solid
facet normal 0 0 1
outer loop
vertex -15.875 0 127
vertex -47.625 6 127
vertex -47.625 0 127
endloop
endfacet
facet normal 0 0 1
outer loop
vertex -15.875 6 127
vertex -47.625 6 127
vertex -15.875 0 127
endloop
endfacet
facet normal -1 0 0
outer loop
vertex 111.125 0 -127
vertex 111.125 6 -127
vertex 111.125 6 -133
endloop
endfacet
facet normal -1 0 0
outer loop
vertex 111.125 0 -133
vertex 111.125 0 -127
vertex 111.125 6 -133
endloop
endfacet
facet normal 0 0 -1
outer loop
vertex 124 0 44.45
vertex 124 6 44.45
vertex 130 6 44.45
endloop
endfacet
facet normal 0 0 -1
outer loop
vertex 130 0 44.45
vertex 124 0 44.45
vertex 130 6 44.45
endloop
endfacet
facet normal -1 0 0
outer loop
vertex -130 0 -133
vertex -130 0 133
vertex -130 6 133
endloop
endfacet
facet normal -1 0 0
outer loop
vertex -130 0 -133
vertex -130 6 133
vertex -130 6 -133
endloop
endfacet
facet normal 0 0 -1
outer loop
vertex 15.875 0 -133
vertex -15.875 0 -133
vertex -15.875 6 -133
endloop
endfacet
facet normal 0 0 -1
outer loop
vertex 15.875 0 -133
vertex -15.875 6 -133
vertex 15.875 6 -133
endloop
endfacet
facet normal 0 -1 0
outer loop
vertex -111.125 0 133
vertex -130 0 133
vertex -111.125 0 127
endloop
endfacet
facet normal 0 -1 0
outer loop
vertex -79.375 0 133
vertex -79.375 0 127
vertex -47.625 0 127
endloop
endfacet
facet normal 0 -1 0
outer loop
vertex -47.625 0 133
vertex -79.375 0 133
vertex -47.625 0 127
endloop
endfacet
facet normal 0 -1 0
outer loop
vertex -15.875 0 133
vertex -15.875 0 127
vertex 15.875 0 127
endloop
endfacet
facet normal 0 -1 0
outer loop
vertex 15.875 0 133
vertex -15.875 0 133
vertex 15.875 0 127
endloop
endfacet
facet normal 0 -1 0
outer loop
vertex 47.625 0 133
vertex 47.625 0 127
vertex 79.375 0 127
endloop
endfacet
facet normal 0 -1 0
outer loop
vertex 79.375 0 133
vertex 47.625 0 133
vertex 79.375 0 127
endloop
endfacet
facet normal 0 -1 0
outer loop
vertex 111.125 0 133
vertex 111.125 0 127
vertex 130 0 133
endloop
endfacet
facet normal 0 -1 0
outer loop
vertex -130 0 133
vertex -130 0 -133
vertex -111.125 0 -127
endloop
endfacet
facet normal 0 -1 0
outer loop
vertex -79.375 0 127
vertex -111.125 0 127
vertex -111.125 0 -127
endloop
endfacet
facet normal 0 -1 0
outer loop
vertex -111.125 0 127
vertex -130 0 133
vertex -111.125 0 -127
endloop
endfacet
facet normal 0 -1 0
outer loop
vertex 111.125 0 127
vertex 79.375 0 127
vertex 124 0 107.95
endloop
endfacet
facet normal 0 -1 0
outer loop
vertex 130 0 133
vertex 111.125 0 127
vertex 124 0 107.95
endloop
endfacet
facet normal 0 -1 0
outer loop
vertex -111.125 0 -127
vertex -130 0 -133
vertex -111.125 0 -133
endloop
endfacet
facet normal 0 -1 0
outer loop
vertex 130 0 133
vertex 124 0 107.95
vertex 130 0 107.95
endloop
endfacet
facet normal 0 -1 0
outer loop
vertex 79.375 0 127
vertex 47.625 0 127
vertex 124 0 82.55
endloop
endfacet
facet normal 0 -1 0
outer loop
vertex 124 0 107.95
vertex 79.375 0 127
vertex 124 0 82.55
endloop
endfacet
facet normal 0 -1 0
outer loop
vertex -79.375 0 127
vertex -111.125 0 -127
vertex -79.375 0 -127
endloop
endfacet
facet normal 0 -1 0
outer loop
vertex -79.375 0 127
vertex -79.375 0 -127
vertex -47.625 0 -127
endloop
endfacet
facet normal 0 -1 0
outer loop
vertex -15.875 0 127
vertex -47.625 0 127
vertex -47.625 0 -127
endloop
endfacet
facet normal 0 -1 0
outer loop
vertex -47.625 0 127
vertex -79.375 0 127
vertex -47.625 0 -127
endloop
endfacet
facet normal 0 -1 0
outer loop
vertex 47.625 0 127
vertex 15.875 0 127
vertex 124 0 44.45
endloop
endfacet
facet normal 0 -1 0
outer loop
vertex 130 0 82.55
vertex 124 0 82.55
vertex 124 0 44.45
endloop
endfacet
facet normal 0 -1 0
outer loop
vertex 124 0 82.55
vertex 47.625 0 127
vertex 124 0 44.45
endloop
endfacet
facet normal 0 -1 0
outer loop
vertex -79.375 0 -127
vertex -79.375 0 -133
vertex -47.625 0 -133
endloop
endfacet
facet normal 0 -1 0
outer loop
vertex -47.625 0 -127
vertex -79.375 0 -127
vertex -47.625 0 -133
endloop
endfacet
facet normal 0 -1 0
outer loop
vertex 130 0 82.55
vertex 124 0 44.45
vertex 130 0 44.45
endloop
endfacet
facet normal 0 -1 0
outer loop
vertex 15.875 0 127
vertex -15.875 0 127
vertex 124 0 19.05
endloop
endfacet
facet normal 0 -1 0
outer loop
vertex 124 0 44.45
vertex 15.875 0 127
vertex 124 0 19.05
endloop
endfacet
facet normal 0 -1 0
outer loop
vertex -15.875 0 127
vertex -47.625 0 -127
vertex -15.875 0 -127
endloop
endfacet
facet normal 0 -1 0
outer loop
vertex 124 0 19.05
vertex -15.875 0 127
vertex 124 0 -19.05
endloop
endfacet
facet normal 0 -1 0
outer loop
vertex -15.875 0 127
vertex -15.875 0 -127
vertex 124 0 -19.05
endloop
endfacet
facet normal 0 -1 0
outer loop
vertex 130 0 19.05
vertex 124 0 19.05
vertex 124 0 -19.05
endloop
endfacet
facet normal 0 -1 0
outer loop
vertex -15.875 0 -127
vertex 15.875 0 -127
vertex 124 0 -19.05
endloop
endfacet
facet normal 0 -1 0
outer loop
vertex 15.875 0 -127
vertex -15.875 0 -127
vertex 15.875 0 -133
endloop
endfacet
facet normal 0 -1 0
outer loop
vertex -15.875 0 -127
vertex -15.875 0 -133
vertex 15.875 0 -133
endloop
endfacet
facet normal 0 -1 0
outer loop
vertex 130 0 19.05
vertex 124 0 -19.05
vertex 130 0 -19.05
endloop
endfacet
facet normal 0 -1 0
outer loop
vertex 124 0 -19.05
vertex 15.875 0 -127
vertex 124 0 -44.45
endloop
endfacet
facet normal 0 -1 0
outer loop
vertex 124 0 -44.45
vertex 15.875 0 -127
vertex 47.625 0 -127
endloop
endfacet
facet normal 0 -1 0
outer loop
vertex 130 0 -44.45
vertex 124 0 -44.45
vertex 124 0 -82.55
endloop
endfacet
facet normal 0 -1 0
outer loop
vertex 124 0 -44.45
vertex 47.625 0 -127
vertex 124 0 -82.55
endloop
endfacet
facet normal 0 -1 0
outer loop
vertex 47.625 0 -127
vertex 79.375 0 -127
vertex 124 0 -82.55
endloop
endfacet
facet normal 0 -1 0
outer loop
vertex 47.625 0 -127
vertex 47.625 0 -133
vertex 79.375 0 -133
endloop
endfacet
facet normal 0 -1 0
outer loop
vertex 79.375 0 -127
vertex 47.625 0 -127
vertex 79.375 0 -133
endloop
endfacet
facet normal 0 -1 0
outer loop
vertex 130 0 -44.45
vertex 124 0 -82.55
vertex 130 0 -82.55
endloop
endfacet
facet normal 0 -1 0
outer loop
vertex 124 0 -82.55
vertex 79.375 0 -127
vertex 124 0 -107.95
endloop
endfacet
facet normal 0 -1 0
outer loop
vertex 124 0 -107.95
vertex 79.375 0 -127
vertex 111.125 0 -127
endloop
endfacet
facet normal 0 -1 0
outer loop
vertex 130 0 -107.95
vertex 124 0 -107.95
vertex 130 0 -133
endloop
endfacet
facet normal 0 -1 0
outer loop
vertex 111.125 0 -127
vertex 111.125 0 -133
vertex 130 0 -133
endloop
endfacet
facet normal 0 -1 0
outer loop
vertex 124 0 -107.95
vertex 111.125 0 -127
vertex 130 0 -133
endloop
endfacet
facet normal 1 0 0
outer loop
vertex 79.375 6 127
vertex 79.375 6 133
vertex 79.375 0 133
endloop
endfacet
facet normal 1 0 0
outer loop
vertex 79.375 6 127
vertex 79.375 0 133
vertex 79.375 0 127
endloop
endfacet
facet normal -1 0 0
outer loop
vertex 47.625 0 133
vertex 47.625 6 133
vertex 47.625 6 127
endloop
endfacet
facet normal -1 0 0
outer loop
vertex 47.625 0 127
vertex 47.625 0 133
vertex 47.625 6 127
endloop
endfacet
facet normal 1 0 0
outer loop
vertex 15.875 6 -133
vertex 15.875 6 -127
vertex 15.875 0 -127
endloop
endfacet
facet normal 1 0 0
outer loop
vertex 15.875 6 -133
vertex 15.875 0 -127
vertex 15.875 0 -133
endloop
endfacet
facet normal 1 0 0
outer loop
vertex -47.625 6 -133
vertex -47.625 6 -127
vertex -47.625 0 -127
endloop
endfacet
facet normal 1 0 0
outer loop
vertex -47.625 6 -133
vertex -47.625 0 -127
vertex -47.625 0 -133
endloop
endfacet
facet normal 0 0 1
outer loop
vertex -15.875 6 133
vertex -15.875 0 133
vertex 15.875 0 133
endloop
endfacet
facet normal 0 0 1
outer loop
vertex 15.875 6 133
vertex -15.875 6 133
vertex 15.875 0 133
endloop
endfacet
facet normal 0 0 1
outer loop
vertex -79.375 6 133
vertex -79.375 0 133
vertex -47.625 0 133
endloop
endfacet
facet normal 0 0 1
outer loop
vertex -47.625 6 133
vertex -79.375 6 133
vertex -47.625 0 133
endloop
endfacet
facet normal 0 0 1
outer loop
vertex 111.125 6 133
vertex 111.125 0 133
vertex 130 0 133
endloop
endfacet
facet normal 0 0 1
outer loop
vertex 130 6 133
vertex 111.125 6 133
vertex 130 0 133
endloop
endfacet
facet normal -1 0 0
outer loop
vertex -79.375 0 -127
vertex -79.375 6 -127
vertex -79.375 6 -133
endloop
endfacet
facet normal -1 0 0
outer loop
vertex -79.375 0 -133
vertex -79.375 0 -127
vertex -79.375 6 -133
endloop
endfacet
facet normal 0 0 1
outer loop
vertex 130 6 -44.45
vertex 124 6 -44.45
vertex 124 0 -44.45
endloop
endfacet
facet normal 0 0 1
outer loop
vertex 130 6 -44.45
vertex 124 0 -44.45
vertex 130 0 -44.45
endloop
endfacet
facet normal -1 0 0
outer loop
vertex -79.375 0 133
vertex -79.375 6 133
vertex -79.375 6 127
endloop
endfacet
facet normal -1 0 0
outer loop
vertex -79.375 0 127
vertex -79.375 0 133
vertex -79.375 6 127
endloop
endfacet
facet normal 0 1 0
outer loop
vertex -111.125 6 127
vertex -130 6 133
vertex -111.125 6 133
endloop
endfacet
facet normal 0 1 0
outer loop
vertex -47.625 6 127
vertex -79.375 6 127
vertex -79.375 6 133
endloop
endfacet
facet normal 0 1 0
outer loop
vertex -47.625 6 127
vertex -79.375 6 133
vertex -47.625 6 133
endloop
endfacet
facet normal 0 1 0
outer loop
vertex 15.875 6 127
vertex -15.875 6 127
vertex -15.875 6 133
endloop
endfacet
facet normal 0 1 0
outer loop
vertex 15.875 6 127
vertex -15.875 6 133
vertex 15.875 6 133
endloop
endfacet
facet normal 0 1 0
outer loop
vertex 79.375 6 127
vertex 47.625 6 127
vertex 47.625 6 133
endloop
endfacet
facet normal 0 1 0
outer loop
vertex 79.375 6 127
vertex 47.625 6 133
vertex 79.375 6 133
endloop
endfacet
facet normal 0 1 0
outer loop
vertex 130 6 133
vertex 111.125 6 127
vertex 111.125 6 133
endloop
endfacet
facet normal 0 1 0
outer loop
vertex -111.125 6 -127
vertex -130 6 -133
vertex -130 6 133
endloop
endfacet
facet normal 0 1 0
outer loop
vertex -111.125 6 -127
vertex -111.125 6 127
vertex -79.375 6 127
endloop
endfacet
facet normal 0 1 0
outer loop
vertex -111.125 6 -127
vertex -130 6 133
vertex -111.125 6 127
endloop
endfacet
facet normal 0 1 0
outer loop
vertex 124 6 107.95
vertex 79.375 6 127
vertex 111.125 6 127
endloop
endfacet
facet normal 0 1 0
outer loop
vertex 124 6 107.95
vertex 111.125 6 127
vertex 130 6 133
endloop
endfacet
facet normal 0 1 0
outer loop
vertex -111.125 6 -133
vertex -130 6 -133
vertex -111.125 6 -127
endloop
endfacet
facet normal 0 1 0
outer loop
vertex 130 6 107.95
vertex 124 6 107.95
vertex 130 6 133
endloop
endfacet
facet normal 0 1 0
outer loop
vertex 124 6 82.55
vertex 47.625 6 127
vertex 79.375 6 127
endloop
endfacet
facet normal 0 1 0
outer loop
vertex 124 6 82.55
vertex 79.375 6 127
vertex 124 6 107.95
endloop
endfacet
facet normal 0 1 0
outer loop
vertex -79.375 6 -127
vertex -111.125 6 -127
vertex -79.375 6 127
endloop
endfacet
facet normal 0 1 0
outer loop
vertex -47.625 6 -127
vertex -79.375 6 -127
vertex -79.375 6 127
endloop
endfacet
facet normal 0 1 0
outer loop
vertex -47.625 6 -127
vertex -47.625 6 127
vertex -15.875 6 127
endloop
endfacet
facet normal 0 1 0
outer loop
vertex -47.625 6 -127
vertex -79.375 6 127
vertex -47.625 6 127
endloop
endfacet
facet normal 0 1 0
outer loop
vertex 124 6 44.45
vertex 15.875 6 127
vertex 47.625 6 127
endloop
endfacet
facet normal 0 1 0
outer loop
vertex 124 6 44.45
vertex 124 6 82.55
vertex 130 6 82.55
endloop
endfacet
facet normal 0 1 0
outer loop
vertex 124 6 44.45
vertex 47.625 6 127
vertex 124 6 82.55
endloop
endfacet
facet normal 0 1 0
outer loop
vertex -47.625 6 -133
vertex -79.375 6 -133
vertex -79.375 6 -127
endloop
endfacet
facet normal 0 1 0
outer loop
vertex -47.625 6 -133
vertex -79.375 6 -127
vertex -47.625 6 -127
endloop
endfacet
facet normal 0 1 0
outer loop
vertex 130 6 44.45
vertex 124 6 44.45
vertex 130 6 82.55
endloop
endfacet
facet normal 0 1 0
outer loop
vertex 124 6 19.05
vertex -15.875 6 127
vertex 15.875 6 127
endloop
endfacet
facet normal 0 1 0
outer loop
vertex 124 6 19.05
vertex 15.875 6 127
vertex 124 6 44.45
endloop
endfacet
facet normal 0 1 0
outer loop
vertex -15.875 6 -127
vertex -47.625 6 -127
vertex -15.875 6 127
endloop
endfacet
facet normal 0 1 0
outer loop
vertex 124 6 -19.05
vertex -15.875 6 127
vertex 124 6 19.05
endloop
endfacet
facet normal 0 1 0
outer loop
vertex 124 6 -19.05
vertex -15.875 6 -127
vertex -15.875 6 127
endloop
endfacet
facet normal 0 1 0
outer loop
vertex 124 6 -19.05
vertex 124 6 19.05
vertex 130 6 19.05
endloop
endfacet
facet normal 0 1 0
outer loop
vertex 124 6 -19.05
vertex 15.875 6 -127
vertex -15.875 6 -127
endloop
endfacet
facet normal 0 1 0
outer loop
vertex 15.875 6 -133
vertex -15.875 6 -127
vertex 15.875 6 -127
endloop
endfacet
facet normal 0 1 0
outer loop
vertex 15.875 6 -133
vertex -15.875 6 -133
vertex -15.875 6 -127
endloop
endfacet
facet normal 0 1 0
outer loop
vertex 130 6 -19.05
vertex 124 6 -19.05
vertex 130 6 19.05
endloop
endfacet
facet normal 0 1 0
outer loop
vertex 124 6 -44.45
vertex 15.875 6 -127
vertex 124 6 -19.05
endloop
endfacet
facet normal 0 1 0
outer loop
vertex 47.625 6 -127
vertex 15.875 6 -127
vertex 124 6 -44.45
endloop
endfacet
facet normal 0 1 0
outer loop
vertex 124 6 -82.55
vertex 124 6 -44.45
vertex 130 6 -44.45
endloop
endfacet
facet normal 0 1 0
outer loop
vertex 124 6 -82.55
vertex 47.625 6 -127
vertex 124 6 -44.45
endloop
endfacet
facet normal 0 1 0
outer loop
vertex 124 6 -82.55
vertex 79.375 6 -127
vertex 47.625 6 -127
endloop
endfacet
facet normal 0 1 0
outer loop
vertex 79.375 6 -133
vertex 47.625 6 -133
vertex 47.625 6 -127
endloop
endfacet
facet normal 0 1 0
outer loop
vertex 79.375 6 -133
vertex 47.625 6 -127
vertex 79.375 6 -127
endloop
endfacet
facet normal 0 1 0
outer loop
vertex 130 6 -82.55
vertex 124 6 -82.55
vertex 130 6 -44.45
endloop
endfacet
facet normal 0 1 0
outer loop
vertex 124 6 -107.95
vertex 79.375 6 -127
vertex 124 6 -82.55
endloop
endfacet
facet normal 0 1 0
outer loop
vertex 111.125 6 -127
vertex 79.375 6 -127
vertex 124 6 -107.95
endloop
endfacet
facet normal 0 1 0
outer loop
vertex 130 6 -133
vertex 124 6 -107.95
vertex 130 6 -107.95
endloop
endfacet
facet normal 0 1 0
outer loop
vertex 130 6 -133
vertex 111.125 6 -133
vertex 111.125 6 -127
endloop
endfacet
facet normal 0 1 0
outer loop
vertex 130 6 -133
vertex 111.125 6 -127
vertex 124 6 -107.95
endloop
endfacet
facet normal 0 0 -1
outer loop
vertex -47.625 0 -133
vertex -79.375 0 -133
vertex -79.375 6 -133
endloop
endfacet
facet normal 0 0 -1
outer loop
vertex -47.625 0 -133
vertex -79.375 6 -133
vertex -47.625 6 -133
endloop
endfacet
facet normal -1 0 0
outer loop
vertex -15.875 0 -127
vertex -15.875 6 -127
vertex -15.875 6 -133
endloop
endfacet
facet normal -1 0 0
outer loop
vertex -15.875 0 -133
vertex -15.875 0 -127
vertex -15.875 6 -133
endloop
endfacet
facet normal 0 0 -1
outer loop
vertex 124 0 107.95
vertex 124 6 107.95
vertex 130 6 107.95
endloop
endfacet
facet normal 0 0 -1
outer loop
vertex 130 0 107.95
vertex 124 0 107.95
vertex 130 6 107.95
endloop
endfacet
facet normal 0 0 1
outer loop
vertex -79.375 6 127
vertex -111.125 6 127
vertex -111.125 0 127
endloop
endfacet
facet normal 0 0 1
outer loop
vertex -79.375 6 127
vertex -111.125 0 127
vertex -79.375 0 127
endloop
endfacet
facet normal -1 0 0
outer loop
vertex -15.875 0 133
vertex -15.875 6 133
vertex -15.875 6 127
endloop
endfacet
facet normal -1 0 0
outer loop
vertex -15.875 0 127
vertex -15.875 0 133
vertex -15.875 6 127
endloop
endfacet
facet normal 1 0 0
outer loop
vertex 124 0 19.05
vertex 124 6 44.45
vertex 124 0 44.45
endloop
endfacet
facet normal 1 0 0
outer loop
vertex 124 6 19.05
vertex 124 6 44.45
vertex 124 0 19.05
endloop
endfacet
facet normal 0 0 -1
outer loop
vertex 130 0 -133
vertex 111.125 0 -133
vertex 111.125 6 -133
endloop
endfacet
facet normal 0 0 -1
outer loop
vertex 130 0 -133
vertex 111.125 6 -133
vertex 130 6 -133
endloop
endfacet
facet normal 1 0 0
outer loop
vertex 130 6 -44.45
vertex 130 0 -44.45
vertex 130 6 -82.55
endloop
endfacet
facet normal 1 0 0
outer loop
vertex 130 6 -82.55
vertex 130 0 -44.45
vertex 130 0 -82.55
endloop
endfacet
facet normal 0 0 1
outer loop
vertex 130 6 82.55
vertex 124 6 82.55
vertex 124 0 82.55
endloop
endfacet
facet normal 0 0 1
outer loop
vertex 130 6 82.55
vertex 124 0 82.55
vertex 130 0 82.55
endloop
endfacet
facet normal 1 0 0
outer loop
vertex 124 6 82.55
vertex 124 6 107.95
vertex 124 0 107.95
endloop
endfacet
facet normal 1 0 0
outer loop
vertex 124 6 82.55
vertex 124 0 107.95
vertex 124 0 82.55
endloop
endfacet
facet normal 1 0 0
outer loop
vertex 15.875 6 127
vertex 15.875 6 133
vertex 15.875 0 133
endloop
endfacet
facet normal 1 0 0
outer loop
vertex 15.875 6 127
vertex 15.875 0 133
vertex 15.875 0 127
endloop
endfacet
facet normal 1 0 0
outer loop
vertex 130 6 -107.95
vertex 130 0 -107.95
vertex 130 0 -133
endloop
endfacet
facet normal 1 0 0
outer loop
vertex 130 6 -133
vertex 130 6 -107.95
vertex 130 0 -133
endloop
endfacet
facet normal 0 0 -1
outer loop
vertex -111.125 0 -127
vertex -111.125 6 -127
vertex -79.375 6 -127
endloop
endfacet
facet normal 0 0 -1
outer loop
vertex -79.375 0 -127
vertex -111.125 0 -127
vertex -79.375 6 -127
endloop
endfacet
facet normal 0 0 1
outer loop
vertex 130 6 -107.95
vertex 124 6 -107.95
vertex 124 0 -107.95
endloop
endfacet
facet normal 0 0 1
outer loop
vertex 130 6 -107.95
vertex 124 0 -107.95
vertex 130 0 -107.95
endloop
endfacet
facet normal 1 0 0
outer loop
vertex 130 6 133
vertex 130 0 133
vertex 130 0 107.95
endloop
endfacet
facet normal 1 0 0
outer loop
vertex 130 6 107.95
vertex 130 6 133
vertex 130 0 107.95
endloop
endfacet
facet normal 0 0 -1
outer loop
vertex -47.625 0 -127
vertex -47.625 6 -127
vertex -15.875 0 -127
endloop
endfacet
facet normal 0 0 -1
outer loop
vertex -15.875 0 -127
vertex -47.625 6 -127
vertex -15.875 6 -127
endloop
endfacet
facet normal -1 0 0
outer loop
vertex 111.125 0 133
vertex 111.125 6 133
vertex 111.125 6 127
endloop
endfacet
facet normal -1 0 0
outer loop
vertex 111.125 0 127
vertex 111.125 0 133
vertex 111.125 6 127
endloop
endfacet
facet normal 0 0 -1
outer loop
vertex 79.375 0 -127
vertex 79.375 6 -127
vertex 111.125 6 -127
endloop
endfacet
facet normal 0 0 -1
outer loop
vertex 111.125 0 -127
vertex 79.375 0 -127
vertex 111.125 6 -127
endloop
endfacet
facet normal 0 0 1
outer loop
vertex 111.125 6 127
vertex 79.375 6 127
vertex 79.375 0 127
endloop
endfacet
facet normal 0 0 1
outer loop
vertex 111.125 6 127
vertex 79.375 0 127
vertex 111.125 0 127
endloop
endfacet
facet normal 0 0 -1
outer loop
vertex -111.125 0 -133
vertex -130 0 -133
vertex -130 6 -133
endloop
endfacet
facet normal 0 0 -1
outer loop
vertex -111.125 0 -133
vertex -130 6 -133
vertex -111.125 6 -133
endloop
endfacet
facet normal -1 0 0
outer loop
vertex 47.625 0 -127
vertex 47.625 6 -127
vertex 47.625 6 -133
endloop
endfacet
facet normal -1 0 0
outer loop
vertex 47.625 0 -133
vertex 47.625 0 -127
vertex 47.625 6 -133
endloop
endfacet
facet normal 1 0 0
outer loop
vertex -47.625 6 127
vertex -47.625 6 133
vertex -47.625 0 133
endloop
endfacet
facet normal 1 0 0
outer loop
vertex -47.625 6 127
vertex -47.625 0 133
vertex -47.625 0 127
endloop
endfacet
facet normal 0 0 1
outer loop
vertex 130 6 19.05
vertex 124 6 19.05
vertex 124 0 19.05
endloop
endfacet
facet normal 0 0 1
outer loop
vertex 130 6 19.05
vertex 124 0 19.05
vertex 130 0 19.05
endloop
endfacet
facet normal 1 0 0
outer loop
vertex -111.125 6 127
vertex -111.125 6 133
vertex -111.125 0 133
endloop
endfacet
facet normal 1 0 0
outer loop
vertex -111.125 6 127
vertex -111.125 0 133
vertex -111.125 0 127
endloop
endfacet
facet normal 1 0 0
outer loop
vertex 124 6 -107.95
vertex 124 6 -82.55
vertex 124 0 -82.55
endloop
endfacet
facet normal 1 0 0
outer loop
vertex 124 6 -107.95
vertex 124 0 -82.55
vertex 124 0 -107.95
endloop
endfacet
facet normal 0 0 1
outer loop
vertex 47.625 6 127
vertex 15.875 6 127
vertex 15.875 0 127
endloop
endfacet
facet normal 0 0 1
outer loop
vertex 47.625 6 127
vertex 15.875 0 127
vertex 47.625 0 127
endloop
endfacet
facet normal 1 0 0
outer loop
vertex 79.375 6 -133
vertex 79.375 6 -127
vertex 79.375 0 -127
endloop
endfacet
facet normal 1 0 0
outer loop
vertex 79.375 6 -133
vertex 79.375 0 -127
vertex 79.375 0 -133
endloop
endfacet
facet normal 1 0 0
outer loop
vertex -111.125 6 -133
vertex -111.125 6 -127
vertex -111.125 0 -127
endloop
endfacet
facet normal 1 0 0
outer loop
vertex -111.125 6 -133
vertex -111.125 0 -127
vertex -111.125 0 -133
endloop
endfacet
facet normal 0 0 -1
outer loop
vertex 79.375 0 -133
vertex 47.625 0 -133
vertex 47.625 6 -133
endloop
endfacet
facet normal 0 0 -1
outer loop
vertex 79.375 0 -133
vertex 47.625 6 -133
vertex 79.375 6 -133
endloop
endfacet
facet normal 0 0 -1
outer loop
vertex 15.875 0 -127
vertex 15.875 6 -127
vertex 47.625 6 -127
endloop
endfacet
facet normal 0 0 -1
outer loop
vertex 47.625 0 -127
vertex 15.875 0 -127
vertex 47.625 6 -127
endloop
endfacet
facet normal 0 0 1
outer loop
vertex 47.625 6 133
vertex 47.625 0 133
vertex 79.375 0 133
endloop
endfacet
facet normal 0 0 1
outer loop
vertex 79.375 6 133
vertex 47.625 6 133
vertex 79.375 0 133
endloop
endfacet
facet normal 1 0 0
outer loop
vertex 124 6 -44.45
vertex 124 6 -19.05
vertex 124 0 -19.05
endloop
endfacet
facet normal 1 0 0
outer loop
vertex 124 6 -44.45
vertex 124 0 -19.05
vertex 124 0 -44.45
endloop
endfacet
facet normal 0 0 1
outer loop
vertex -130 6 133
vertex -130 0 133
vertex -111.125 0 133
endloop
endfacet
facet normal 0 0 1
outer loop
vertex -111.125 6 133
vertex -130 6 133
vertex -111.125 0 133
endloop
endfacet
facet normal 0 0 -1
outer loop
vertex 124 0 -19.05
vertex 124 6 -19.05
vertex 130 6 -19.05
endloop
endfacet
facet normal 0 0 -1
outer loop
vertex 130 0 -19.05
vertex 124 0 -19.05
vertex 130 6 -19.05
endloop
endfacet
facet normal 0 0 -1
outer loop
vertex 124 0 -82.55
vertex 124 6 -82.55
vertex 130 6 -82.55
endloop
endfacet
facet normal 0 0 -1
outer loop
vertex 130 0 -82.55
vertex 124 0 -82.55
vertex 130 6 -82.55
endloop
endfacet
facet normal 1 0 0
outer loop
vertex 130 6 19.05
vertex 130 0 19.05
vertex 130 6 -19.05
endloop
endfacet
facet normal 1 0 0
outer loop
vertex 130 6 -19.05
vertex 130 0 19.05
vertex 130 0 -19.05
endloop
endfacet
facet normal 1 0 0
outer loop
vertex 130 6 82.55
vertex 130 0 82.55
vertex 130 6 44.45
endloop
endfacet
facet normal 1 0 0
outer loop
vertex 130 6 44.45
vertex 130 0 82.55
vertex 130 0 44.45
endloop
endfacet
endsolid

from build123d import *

# Parameters (mm, degrees)
SKETCH1_W           = 260
SKETCH1_H           = 266
BOSS_EXTRUDE1_DEPTH = 6
SKETCH2_W           = 31.75
SKETCH2_H           = 6
SKETCH2_W_2         = 6
SKETCH2_H_2         = 25.4
TAB_CUT_OUTS_DEPTH  = 6


with BuildPart() as part:
    # Sketch1 → Boss-Extrude1 (new body)
    with BuildSketch(Plane(origin=(0, 0, 0), x_dir=(1, 0, 0), z_dir=(0, 1, 0))):
        Rectangle(SKETCH1_W, SKETCH1_H)
    extrude(amount=BOSS_EXTRUDE1_DEPTH)

    # Sketch2 → Tab Cut Outs (cut)
    with BuildSketch(Plane(origin=(0, 6, 0), x_dir=(1, 0, 0), z_dir=(0, 1, 0))):
        with Locations((95.25, 130)):
            Rectangle(SKETCH2_W, SKETCH2_H)
        with Locations((-31.75, 130)):
            Rectangle(SKETCH2_W, SKETCH2_H)
        with Locations((-95.25, 130)):
            Rectangle(SKETCH2_W, SKETCH2_H)
        with Locations((31.75, 130)):
            Rectangle(SKETCH2_W, SKETCH2_H)
        with Locations((31.75, -130)):
            Rectangle(SKETCH2_W, SKETCH2_H)
        with Locations((95.25, -130)):
            Rectangle(SKETCH2_W, SKETCH2_H)
        with Locations((-95.25, -130)):
            Rectangle(SKETCH2_W, SKETCH2_H)
        with Locations((-31.75, -130)):
            Rectangle(SKETCH2_W, SKETCH2_H)
        with Locations((127, -95.25)):
            Rectangle(SKETCH2_W_2, SKETCH2_H_2)
        with Locations((127, 31.75)):
            Rectangle(SKETCH2_W_2, SKETCH2_H_2)
        with Locations((127, 95.25)):
            Rectangle(SKETCH2_W_2, SKETCH2_H_2)
        with Locations((127, -31.75)):
            Rectangle(SKETCH2_W_2, SKETCH2_H_2)
    extrude(amount=-TAB_CUT_OUTS_DEPTH, mode=Mode.SUBTRACT)


solid = part.part
